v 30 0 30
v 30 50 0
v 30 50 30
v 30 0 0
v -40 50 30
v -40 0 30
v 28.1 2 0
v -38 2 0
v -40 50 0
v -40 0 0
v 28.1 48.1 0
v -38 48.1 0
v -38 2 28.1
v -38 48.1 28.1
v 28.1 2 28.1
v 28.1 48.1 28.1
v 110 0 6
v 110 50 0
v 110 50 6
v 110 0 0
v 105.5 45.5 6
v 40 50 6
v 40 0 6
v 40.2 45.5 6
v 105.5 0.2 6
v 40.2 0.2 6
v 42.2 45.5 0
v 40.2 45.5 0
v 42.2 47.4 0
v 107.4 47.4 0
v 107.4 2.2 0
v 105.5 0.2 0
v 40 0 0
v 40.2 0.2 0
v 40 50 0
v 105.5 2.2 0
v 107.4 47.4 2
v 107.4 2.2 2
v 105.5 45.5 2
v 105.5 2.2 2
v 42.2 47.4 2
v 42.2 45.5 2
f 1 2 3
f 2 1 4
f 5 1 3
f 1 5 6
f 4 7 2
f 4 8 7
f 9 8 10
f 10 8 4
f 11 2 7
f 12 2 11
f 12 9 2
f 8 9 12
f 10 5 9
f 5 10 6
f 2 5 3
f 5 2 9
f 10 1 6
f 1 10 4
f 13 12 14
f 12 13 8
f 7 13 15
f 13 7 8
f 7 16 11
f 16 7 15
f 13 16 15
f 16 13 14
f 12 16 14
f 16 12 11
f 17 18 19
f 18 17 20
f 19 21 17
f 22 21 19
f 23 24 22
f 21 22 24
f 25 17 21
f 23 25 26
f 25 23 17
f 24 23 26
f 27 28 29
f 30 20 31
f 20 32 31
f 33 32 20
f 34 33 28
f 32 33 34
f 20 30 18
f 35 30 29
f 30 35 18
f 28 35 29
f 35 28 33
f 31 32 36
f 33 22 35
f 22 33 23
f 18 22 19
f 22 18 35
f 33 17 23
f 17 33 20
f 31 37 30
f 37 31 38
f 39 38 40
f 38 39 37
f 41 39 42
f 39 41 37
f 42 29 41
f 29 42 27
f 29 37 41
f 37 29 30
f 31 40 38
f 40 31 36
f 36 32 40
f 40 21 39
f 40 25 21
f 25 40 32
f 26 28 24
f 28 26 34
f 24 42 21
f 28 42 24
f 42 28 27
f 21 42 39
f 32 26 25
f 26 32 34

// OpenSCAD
// Two-part enclosure for small electronics board
// Part 1: Box (left)
// Part 2: Lid (right, printed upside down)
// Prints together with a 10mm gap between them.

// --- Dimensions ---
// Box Outer Dimensions (X x Y x Z)
$box_outer_x = 70;
$box_outer_y = 50;
$box_outer_z = 30;

// Wall and Floor Thickness
$wall_thickness = 2;
$floor_thickness = 2;

// Lid Dimensions
// Plate thickness
$plate_thickness = 2;
// Lip dimensions
$lip_thickness = 1.5;
$lip_height = 4;
// Lip outer size (fits inside box opening)
$lip_outer_x = 65.6;
$lip_outer_y = 45.6;

// Clearance
$clearance = 0.2;

// Gap between parts
$gap = 10;

// --- Configuration ---
$fn = 64; // Smooth curves

// --- Part 1: The Box ---
// Position: Centered on its own footprint, then shifted to left side of bed.
// Footprint: 70 x 50.
// Box center X = -($box_outer_x/2 + $gap/2)
// Box center Y = 0
translate([-($box_outer_x/2 + $gap/2), 0, 0])
difference() {
    // Outer Block
    cube([
        $box_outer_x, 
        $box_outer_y, 
        $box_outer_z
    ]);
    
    // Cut out the inside (hollow)
    // Inner X = Outer X - 2*Wall
    // Inner Y = Outer Y - 2*Wall
    // Inner Z = Outer Z - Floor
    translate([
        $wall_thickness, 
        $wall_thickness, 
        0
    ])
    cube([
        $box_outer_x - (2 * $wall_thickness), 
        $box_outer_y - (2 * $wall_thickness), 
        $box_outer_z - $floor_thickness
    ]);
    
    // Extend cut slightly to ensure clean separation
    translate([
        $wall_thickness, 
        $wall_thickness, 
        0
    ])
    cube([
        $box_outer_x - (2 * $wall_thickness) + 0.1, 
        $box_outer_y - (2 * $wall_thickness) + 0.1, 
        $box_outer_z - $floor_thickness + 0.1
    ]);
}

// --- Part 2: The Lid ---
// Position: Centered on its own footprint, then shifted to right side of bed.
// Footprint: 70 x 50.
// Lid center X = ($box_outer_x/2 + $gap/2)
// Lid center Y = 0
// The lid is printed upside down (plate on bed), so we build it normally 
// but the "lip" is the top part of the geometry relative to the print direction.
// However, the prompt says "printed upside down: a plate... lying on the bed".
// This implies the plate is at Z=0, and the lip sticks UP from the plate.
// The lip slides INTO the box.
// Box inner top Z = $box_outer_z - $floor_thickness = 28.
// Lip height = 4.
// So the top of the lip is at Z=4. This fits easily under the box top (Z=30).

translate([($box_outer_x/2 + $gap/2), 0, 0])
difference() {
    // Outer Block (Plate + Lip volume)
    // Width: 70, Depth: 50, Height: Plate + Lip
    cube([
        $box_outer_x, 
        $box_outer_y, 
        $plate_thickness + $lip_height
    ]);
    
    // Cut out the hole for the electronics (under the lip)
    // The hole goes through the plate and up to the bottom of the lip.
    // Hole X = Lip Outer X - 2*Clearance
    // Hole Y = Lip Outer Y - 2*Clearance
    // Hole Z = Plate Thickness (so it stops at the top of the plate)
    translate([
        $wall_thickness, // Align with box wall logic for reference, but calculate based on lip
        $wall_thickness, 
        0
    ])
    // Calculate inner hole dimensions based on lip outer size and clearance
    translate([
        ($lip_outer_x/2) - ($lip_outer_x/2 - $clearance), 
        ($lip_outer_y/2) - ($lip_outer_y/2 - $clearance), 
        0
    ])
    cube([
        $lip_outer_x - (2 * $clearance), 
        $lip_outer_y - (2 * $clearance), 
        $plate_thickness
    ]);
    
    // Extend cut slightly
    translate([
        ($lip_outer_x/2) - ($lip_outer_x/2 - $clearance), 
        ($lip_outer_y/2) - ($lip_outer_y/2 - $clearance), 
        0
    ])
    cube([
        $lip_outer_x - (2 * $clearance) + 0.1, 
        $lip_outer_y - (2 * $clearance) + 0.1, 
        $plate_thickness + 0.1
    ]);
    
    // Cut out the lip itself (the part that goes over the box)
    // Lip is centered on the plate.
    // Lip Outer X = 65.6, Lip Outer Y = 45.6
    // Lip Inner X = Lip Outer X - 2*Clearance
    // Lip Inner Y = Lip Outer Y - 2*Clearance
    translate([
        ($lip_outer_x/2) - ($lip_outer_x/2 - $clearance), 
        ($lip_outer_y/2) - ($lip_outer_y/2 - $clearance), 
        $plate_thickness
    ])
    cube([
        $lip_outer_x - (2 * $clearance), 
        $lip_outer_y - (2 * $clearance), 
        $lip_height
    ]);
    
    // Extend cut slightly
    translate([
        ($lip_outer_x/2) - ($lip_outer_x/2 - $clearance), 
        ($lip_outer_y/2) - ($lip_outer_y/2 - $clearance), 
        $plate_thickness
    ])
    cube([
        $lip_outer_x - (2 * $clearance) + 0.1, 
        $lip_outer_y - (2 * $clearance) + 0.1, 
        $lip_height + 0.1
    ]);
}
